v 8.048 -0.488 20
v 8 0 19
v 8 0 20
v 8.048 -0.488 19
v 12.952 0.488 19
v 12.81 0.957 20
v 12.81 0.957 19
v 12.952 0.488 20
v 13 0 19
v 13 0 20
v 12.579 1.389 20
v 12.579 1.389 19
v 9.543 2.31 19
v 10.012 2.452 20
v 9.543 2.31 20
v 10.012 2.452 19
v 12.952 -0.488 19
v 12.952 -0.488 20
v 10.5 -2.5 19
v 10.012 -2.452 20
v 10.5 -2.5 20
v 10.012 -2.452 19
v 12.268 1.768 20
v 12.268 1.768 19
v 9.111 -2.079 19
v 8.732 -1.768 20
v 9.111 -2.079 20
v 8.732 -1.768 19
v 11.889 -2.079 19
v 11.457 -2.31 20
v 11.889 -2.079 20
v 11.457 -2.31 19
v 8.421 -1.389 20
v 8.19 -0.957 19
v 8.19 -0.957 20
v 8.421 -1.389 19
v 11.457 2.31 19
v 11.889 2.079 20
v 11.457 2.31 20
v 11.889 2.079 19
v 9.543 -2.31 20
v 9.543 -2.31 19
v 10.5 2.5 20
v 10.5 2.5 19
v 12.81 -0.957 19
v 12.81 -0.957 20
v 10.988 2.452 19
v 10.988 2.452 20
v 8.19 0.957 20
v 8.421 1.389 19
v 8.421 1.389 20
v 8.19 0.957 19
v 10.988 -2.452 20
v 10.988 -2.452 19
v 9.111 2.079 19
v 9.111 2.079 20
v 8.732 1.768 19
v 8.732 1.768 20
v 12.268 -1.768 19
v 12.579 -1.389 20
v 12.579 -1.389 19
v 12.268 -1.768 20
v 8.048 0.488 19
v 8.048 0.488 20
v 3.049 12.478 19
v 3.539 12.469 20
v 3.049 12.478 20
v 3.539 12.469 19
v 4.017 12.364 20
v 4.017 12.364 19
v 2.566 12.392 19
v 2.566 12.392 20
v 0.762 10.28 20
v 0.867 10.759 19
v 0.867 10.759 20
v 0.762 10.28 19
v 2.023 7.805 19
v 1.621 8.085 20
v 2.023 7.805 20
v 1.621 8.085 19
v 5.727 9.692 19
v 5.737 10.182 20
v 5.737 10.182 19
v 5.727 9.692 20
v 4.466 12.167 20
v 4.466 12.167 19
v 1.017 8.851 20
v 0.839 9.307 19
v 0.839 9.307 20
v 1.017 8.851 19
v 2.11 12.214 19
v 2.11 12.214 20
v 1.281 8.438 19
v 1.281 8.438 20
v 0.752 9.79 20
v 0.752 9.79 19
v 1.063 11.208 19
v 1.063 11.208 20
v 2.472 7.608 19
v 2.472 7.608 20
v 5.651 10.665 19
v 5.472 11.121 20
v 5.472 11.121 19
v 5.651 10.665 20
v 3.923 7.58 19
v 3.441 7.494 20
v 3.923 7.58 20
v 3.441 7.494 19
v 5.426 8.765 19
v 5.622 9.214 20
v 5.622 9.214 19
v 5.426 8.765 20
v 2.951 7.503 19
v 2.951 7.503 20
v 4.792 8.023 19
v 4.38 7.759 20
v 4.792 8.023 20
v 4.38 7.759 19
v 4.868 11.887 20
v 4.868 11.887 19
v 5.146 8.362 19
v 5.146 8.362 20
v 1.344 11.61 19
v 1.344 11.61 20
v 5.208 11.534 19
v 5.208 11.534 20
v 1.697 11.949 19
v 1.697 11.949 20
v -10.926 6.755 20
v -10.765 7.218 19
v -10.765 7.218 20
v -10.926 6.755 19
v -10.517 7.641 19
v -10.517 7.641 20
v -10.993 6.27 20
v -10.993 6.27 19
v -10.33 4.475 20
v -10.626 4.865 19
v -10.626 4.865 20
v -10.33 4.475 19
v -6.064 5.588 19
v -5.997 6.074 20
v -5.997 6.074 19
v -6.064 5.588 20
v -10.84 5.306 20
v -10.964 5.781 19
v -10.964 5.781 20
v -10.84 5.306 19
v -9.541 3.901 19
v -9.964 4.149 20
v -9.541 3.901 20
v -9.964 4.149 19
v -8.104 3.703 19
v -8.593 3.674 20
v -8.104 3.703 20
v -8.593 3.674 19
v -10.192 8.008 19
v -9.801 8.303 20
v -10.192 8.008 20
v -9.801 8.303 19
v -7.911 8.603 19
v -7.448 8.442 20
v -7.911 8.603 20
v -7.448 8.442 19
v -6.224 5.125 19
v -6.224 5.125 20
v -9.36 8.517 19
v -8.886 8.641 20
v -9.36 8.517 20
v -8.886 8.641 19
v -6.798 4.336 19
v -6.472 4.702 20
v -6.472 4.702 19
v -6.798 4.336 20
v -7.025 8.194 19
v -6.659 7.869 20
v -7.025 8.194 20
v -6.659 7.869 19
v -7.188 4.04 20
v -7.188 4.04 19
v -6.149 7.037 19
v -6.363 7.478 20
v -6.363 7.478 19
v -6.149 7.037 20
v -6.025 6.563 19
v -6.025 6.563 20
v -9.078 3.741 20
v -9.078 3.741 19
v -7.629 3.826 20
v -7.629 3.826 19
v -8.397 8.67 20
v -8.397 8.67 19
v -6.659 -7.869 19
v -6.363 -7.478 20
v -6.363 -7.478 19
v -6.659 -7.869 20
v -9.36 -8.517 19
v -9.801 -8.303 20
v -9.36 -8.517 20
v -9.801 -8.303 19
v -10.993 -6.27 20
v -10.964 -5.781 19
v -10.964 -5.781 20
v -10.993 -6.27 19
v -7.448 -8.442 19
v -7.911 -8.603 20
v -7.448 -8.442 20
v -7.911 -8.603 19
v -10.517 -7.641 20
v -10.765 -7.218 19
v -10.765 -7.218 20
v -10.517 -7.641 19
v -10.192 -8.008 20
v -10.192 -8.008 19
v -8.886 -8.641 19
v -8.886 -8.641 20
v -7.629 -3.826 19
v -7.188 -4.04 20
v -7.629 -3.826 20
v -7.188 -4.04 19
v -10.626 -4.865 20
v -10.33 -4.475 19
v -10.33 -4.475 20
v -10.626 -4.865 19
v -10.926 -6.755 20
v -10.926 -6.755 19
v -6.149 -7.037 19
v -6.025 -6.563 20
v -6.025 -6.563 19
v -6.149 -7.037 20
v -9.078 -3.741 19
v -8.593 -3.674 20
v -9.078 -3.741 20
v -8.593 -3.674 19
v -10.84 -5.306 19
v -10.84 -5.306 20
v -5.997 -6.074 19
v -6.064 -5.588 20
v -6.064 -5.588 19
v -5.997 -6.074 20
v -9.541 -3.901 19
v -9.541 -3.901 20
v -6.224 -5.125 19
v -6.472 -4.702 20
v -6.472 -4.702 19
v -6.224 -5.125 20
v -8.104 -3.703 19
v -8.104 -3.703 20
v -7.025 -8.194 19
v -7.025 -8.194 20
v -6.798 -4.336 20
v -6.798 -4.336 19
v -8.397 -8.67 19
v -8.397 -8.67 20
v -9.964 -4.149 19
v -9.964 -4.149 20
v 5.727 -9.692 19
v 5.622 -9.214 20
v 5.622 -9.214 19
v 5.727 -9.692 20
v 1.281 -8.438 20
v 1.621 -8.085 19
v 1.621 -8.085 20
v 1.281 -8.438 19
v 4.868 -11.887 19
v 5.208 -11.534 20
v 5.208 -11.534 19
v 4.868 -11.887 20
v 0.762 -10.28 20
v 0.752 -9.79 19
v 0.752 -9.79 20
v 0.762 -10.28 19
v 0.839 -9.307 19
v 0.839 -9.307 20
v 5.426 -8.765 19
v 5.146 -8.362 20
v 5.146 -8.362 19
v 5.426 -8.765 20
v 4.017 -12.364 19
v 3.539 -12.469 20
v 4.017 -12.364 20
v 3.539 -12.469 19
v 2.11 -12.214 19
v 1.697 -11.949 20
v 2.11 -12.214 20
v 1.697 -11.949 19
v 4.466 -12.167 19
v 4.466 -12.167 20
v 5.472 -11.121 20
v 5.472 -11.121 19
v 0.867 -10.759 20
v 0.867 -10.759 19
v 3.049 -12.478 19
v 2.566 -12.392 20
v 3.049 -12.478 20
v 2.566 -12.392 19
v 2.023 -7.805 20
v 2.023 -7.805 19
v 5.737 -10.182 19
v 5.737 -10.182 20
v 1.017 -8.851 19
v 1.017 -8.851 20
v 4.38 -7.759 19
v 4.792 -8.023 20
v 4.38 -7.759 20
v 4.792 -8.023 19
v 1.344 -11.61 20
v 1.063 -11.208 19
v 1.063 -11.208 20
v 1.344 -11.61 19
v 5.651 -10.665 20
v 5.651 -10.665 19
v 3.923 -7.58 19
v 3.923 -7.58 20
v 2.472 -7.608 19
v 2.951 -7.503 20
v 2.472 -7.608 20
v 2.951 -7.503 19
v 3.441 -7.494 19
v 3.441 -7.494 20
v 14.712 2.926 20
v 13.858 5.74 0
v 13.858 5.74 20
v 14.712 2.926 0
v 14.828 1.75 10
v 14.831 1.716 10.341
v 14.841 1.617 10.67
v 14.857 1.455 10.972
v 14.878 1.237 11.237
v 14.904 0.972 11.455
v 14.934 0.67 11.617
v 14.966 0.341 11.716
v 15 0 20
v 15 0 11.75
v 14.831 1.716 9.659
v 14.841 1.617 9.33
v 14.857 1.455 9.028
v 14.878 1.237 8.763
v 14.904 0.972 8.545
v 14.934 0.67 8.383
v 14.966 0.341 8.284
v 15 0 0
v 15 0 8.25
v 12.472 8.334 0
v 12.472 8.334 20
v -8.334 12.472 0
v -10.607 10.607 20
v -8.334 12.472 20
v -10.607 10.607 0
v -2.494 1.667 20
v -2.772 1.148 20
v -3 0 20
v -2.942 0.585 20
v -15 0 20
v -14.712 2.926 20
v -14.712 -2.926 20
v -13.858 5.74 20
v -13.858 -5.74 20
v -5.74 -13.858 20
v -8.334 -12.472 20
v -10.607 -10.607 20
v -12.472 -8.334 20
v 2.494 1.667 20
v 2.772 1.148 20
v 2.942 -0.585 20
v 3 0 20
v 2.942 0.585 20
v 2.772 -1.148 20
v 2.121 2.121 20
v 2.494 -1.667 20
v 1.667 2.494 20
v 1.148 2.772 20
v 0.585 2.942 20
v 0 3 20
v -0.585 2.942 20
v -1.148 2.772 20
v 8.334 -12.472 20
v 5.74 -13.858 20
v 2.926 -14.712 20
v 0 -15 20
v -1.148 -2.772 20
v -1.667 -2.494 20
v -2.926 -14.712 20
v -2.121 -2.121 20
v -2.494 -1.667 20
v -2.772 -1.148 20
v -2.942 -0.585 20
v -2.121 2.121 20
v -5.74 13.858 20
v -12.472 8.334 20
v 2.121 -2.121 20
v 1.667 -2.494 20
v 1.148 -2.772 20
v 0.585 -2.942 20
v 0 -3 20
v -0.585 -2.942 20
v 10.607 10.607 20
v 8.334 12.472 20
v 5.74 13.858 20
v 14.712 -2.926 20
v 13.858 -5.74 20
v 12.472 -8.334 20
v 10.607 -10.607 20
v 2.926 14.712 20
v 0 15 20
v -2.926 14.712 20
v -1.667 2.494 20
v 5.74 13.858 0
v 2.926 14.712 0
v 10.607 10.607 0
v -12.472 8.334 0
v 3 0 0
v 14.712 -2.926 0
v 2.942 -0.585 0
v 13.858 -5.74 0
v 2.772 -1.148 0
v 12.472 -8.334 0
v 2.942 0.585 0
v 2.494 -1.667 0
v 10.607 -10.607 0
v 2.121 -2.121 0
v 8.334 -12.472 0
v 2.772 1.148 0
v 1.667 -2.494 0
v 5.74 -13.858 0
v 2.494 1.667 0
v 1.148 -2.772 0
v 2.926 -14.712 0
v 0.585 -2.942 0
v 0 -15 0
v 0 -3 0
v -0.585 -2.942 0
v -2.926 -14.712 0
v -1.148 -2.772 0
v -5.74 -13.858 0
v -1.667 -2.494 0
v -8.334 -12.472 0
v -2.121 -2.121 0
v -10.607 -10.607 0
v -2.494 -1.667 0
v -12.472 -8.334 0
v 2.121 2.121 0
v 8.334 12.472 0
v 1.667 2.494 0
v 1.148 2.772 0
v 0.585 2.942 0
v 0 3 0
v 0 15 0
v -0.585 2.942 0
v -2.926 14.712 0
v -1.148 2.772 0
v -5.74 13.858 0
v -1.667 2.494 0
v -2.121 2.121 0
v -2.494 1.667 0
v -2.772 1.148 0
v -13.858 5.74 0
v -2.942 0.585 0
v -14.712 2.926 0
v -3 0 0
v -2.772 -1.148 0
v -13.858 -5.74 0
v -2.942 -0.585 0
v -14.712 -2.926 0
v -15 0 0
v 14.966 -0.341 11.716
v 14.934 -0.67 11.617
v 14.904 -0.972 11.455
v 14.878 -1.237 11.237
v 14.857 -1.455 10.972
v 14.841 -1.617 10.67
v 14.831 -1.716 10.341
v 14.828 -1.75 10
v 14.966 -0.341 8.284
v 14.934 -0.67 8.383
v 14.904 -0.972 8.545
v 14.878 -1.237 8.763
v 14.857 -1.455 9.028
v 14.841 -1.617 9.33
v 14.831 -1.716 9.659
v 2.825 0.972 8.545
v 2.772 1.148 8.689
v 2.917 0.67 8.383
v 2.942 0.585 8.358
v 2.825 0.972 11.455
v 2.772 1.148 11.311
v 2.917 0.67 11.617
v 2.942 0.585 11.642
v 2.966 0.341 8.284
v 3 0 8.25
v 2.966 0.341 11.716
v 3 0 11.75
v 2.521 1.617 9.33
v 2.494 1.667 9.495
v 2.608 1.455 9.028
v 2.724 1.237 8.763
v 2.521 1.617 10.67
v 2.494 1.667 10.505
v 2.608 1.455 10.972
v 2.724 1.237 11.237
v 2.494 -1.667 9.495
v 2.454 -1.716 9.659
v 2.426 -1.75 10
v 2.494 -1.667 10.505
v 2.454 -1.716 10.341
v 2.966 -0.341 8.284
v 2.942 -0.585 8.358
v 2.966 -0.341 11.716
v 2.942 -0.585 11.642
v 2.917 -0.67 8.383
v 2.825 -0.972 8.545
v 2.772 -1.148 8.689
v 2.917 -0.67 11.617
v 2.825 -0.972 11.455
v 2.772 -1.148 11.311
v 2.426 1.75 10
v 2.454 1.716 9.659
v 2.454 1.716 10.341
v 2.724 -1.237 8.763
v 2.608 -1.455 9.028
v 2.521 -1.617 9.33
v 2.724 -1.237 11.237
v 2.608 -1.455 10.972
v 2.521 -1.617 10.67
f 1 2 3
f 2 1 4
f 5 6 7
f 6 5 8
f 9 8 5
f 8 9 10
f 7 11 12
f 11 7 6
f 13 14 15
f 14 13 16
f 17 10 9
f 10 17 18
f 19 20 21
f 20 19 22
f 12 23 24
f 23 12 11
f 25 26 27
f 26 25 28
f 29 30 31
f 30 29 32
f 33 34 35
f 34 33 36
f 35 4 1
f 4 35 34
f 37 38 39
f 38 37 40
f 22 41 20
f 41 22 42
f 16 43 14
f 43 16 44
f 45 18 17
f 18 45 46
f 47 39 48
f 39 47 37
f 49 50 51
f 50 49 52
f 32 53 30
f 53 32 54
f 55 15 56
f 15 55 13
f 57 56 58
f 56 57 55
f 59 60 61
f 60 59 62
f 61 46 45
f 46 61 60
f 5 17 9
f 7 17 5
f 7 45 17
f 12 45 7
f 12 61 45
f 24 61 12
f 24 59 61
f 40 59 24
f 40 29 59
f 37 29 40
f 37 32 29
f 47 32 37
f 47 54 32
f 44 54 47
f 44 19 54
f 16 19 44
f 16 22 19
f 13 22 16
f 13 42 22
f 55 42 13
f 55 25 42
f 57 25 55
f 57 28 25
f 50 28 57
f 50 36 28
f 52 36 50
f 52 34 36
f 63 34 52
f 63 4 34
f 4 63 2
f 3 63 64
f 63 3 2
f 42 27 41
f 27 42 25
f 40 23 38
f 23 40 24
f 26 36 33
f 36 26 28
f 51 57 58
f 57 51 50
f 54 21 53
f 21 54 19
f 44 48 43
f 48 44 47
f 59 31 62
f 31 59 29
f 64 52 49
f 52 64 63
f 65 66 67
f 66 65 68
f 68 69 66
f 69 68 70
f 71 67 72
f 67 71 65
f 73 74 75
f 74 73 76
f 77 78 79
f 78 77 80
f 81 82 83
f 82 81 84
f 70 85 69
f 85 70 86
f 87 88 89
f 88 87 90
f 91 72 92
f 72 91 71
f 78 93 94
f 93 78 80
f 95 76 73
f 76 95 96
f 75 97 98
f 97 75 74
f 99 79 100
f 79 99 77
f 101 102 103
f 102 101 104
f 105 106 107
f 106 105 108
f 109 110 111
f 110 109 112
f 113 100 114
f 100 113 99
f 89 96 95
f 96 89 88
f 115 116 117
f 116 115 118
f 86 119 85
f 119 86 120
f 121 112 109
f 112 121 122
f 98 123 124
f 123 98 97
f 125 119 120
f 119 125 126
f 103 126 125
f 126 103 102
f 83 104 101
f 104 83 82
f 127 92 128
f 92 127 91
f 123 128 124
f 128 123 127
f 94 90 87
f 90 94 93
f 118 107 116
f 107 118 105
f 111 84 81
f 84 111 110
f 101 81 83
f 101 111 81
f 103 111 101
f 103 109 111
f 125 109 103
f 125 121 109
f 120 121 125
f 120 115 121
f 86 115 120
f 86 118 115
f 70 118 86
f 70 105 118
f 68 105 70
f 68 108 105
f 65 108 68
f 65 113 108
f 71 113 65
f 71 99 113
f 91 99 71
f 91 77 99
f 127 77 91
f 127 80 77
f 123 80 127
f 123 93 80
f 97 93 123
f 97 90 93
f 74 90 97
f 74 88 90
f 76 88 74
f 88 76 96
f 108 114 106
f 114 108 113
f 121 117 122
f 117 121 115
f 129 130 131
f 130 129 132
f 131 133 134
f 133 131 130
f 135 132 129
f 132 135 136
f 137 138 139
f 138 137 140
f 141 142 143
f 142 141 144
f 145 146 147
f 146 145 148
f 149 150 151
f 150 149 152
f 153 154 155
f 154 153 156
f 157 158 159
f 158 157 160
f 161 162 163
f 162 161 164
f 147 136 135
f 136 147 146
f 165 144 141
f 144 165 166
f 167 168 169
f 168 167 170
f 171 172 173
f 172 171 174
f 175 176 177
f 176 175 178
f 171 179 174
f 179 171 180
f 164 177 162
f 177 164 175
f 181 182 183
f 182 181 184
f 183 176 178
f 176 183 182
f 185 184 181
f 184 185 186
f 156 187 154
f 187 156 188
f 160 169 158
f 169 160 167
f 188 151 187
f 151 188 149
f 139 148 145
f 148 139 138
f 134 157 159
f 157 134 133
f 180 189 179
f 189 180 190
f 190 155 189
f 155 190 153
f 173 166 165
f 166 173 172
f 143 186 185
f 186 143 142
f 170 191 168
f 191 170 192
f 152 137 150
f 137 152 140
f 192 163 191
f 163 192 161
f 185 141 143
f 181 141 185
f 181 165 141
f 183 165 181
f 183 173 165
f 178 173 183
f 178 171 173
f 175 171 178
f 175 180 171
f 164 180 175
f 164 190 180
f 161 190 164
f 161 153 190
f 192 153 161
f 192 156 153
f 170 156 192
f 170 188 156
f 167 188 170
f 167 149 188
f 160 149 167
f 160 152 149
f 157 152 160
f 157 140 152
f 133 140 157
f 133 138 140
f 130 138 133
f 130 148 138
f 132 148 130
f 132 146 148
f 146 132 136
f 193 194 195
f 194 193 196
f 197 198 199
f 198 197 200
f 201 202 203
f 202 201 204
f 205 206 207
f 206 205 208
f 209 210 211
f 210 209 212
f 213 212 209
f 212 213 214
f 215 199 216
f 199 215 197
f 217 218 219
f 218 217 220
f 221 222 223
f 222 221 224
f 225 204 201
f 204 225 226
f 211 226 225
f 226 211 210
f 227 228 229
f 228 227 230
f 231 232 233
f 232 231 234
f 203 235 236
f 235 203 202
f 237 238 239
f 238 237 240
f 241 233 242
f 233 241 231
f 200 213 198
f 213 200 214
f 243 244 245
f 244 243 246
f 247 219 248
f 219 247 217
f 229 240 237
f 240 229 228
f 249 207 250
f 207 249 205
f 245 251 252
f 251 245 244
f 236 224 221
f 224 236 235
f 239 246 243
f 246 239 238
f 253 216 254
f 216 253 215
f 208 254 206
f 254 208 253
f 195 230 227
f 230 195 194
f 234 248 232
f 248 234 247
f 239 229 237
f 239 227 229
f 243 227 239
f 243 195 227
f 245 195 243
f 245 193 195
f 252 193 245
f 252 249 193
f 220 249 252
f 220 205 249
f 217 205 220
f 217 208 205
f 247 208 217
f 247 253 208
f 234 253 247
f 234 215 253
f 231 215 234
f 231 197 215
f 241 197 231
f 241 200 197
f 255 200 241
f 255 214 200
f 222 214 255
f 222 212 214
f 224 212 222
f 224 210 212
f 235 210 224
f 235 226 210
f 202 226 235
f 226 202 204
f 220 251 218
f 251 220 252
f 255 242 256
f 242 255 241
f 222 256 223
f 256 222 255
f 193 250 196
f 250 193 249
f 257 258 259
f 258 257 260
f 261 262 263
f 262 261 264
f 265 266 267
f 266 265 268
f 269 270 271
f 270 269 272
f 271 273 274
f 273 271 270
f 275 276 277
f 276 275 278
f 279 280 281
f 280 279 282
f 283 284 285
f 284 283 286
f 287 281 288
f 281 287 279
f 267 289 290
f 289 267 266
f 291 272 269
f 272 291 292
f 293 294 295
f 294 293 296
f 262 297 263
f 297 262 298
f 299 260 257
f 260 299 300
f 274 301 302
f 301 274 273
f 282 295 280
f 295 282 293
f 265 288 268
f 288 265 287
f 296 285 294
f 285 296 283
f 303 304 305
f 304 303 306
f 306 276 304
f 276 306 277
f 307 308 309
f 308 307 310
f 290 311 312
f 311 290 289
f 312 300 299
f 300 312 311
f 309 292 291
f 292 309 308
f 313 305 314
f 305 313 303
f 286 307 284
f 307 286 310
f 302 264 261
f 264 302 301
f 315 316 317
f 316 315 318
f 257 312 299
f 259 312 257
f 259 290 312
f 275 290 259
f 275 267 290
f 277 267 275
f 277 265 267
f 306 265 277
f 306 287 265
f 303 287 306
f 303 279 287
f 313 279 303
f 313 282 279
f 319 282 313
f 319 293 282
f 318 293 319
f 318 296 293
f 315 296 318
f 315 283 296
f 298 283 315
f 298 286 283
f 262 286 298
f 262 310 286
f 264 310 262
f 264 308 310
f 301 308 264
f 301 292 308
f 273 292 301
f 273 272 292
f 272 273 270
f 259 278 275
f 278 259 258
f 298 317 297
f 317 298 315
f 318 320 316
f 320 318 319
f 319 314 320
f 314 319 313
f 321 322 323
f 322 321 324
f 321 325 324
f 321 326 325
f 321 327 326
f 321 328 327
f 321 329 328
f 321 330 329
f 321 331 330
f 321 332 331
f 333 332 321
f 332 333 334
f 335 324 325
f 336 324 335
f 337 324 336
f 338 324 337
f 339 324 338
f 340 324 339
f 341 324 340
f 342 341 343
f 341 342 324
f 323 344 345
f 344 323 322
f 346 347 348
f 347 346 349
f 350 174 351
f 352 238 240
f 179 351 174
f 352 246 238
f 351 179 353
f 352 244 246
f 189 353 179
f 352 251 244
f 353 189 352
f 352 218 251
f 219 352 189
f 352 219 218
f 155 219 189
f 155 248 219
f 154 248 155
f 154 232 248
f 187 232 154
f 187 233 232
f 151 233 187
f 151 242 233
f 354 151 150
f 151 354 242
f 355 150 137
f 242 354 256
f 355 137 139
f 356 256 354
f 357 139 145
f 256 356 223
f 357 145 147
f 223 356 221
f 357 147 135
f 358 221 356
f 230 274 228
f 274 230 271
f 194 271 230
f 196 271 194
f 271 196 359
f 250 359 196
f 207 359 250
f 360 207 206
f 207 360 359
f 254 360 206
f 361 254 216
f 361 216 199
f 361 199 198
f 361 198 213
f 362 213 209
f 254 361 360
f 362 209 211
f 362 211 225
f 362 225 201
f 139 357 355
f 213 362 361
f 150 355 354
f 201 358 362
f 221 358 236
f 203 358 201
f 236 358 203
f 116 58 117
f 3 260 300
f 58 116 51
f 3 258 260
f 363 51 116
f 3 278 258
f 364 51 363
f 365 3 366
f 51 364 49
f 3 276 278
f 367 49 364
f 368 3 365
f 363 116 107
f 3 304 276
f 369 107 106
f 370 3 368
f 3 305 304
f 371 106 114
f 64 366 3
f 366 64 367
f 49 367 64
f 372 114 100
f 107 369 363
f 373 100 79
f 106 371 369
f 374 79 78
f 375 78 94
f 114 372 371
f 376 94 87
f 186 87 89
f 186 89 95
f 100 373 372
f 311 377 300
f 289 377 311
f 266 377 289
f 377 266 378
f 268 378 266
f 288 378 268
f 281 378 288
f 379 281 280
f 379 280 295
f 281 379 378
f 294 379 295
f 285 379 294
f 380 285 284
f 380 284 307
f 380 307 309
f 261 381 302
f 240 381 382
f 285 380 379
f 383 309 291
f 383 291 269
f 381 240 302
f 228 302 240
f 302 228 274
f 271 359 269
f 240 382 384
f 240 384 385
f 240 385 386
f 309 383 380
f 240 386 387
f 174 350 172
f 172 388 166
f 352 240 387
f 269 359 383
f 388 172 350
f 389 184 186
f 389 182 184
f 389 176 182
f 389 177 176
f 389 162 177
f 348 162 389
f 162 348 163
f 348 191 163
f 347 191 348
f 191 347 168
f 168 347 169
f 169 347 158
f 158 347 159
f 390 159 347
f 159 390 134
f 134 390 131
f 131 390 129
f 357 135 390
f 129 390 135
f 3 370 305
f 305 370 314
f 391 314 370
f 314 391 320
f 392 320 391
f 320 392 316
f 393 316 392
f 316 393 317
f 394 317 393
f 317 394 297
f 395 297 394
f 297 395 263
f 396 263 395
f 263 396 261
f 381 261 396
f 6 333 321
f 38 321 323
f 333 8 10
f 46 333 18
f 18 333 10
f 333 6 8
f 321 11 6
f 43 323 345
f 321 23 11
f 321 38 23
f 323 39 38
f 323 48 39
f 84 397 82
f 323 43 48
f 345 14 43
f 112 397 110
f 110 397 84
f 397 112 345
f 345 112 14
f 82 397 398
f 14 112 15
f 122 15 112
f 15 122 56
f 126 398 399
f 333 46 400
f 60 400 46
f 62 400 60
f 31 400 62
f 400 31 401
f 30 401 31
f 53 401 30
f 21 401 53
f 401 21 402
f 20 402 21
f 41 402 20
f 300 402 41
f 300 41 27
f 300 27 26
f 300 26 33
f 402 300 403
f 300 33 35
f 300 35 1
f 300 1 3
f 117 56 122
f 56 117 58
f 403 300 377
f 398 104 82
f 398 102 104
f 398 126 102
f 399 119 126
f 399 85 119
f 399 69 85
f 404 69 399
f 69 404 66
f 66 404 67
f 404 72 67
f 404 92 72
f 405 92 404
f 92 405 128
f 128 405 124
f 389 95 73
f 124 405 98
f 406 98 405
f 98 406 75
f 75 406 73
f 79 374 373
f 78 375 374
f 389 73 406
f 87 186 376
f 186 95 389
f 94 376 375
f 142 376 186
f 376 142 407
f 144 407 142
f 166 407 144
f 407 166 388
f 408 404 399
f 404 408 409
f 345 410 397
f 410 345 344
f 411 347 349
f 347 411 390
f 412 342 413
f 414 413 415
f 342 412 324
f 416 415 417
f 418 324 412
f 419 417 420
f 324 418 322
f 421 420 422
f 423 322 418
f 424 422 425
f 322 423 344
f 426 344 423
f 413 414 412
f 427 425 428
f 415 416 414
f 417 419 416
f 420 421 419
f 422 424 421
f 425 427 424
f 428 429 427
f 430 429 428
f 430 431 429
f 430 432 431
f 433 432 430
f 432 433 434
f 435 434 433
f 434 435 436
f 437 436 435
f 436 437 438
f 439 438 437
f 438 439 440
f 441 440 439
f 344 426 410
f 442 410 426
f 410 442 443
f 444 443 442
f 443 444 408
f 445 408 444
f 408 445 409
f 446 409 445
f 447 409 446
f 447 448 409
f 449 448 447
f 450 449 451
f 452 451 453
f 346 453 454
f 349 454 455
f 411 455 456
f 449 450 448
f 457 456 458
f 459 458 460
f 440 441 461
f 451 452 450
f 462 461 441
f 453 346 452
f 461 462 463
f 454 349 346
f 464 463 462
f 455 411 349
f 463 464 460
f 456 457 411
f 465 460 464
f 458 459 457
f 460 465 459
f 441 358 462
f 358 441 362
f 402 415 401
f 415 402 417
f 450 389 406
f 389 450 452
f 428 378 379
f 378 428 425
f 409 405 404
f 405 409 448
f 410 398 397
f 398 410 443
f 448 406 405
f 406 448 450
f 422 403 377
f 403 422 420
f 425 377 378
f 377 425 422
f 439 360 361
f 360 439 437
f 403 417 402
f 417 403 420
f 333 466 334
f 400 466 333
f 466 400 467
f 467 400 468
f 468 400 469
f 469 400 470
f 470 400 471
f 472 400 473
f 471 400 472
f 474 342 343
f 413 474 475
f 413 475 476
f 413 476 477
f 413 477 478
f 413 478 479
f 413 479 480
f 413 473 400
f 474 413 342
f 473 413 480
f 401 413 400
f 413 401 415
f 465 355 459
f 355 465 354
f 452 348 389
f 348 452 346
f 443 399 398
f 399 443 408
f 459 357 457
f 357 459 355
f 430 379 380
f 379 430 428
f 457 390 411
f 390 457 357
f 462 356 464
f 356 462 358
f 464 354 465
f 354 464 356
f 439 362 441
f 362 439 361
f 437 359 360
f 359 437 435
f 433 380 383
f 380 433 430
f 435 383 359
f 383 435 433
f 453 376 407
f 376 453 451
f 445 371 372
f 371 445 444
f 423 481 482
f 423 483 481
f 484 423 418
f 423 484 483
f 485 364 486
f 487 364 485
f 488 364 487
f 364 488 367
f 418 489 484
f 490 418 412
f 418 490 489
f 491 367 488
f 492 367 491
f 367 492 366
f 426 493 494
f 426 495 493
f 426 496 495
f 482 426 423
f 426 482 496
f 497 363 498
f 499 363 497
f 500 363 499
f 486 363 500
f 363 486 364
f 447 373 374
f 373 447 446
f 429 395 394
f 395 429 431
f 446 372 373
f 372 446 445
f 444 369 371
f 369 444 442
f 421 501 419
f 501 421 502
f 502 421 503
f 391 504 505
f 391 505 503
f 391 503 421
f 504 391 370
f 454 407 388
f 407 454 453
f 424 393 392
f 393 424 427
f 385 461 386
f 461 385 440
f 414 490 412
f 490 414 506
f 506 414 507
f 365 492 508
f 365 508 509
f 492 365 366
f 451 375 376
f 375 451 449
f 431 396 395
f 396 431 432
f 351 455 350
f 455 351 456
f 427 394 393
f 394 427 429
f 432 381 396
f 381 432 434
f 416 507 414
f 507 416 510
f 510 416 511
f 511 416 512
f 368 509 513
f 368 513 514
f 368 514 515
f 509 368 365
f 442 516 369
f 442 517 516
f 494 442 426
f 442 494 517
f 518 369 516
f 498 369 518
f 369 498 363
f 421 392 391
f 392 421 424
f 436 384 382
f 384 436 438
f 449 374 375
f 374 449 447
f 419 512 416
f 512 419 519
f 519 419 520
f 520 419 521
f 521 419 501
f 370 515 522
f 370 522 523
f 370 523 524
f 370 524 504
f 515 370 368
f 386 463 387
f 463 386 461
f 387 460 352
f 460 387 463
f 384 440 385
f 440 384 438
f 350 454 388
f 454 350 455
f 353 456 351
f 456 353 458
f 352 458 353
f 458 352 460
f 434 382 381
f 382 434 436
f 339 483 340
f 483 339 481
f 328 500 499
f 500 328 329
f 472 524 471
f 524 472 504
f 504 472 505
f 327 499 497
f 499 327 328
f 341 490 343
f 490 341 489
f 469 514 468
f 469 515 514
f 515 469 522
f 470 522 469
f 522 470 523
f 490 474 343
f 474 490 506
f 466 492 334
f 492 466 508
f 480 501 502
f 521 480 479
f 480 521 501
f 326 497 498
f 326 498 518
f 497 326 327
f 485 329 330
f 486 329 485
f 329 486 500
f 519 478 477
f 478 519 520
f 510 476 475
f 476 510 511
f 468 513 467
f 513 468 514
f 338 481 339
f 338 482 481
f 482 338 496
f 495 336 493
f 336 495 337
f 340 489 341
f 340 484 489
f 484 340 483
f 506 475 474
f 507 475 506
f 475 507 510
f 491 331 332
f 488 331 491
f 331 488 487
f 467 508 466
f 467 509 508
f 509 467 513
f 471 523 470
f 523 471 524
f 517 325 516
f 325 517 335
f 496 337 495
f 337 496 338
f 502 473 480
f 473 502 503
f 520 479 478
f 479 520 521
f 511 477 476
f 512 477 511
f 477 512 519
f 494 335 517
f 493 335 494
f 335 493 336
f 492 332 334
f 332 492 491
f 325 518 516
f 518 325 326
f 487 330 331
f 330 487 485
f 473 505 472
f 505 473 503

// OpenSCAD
$fn = 32;

// ----------------------------------------------------------------------
// Control knob: dimpled knob
// ----------------------------------------------------------------------

// --- parameters (mm) ---
dimp_d = 5;               // finger dimple diameter
n_dimp = 5;               // number of dimples
dimp_r = 10.5;            // dimple ring radius
knob_d = 30;              // knob body diameter
knob_h = 20;              // knob body height
bore_d = 6;               // shaft bore diameter
set_d = 3.5;              // set screw bore diameter

dimp_step = 360 / n_dimp;  // dimple angular step

difference() {
  cylinder(h = knob_h, d = knob_d);
  translate([0, 0, -1]) cylinder(h = knob_h + 2, d = bore_d);
  translate([-1, 0, knob_h / 2]) rotate([0, 90, 0])
    cylinder(h = knob_d / 2 + bore_d / 2 + 2, d = set_d);  for (i = [0 : n_dimp - 1])
    rotate([0, 0, i * dimp_step])
      translate([dimp_r, 0, knob_h - 1])
        cylinder(h = 2, d = dimp_d);
}
